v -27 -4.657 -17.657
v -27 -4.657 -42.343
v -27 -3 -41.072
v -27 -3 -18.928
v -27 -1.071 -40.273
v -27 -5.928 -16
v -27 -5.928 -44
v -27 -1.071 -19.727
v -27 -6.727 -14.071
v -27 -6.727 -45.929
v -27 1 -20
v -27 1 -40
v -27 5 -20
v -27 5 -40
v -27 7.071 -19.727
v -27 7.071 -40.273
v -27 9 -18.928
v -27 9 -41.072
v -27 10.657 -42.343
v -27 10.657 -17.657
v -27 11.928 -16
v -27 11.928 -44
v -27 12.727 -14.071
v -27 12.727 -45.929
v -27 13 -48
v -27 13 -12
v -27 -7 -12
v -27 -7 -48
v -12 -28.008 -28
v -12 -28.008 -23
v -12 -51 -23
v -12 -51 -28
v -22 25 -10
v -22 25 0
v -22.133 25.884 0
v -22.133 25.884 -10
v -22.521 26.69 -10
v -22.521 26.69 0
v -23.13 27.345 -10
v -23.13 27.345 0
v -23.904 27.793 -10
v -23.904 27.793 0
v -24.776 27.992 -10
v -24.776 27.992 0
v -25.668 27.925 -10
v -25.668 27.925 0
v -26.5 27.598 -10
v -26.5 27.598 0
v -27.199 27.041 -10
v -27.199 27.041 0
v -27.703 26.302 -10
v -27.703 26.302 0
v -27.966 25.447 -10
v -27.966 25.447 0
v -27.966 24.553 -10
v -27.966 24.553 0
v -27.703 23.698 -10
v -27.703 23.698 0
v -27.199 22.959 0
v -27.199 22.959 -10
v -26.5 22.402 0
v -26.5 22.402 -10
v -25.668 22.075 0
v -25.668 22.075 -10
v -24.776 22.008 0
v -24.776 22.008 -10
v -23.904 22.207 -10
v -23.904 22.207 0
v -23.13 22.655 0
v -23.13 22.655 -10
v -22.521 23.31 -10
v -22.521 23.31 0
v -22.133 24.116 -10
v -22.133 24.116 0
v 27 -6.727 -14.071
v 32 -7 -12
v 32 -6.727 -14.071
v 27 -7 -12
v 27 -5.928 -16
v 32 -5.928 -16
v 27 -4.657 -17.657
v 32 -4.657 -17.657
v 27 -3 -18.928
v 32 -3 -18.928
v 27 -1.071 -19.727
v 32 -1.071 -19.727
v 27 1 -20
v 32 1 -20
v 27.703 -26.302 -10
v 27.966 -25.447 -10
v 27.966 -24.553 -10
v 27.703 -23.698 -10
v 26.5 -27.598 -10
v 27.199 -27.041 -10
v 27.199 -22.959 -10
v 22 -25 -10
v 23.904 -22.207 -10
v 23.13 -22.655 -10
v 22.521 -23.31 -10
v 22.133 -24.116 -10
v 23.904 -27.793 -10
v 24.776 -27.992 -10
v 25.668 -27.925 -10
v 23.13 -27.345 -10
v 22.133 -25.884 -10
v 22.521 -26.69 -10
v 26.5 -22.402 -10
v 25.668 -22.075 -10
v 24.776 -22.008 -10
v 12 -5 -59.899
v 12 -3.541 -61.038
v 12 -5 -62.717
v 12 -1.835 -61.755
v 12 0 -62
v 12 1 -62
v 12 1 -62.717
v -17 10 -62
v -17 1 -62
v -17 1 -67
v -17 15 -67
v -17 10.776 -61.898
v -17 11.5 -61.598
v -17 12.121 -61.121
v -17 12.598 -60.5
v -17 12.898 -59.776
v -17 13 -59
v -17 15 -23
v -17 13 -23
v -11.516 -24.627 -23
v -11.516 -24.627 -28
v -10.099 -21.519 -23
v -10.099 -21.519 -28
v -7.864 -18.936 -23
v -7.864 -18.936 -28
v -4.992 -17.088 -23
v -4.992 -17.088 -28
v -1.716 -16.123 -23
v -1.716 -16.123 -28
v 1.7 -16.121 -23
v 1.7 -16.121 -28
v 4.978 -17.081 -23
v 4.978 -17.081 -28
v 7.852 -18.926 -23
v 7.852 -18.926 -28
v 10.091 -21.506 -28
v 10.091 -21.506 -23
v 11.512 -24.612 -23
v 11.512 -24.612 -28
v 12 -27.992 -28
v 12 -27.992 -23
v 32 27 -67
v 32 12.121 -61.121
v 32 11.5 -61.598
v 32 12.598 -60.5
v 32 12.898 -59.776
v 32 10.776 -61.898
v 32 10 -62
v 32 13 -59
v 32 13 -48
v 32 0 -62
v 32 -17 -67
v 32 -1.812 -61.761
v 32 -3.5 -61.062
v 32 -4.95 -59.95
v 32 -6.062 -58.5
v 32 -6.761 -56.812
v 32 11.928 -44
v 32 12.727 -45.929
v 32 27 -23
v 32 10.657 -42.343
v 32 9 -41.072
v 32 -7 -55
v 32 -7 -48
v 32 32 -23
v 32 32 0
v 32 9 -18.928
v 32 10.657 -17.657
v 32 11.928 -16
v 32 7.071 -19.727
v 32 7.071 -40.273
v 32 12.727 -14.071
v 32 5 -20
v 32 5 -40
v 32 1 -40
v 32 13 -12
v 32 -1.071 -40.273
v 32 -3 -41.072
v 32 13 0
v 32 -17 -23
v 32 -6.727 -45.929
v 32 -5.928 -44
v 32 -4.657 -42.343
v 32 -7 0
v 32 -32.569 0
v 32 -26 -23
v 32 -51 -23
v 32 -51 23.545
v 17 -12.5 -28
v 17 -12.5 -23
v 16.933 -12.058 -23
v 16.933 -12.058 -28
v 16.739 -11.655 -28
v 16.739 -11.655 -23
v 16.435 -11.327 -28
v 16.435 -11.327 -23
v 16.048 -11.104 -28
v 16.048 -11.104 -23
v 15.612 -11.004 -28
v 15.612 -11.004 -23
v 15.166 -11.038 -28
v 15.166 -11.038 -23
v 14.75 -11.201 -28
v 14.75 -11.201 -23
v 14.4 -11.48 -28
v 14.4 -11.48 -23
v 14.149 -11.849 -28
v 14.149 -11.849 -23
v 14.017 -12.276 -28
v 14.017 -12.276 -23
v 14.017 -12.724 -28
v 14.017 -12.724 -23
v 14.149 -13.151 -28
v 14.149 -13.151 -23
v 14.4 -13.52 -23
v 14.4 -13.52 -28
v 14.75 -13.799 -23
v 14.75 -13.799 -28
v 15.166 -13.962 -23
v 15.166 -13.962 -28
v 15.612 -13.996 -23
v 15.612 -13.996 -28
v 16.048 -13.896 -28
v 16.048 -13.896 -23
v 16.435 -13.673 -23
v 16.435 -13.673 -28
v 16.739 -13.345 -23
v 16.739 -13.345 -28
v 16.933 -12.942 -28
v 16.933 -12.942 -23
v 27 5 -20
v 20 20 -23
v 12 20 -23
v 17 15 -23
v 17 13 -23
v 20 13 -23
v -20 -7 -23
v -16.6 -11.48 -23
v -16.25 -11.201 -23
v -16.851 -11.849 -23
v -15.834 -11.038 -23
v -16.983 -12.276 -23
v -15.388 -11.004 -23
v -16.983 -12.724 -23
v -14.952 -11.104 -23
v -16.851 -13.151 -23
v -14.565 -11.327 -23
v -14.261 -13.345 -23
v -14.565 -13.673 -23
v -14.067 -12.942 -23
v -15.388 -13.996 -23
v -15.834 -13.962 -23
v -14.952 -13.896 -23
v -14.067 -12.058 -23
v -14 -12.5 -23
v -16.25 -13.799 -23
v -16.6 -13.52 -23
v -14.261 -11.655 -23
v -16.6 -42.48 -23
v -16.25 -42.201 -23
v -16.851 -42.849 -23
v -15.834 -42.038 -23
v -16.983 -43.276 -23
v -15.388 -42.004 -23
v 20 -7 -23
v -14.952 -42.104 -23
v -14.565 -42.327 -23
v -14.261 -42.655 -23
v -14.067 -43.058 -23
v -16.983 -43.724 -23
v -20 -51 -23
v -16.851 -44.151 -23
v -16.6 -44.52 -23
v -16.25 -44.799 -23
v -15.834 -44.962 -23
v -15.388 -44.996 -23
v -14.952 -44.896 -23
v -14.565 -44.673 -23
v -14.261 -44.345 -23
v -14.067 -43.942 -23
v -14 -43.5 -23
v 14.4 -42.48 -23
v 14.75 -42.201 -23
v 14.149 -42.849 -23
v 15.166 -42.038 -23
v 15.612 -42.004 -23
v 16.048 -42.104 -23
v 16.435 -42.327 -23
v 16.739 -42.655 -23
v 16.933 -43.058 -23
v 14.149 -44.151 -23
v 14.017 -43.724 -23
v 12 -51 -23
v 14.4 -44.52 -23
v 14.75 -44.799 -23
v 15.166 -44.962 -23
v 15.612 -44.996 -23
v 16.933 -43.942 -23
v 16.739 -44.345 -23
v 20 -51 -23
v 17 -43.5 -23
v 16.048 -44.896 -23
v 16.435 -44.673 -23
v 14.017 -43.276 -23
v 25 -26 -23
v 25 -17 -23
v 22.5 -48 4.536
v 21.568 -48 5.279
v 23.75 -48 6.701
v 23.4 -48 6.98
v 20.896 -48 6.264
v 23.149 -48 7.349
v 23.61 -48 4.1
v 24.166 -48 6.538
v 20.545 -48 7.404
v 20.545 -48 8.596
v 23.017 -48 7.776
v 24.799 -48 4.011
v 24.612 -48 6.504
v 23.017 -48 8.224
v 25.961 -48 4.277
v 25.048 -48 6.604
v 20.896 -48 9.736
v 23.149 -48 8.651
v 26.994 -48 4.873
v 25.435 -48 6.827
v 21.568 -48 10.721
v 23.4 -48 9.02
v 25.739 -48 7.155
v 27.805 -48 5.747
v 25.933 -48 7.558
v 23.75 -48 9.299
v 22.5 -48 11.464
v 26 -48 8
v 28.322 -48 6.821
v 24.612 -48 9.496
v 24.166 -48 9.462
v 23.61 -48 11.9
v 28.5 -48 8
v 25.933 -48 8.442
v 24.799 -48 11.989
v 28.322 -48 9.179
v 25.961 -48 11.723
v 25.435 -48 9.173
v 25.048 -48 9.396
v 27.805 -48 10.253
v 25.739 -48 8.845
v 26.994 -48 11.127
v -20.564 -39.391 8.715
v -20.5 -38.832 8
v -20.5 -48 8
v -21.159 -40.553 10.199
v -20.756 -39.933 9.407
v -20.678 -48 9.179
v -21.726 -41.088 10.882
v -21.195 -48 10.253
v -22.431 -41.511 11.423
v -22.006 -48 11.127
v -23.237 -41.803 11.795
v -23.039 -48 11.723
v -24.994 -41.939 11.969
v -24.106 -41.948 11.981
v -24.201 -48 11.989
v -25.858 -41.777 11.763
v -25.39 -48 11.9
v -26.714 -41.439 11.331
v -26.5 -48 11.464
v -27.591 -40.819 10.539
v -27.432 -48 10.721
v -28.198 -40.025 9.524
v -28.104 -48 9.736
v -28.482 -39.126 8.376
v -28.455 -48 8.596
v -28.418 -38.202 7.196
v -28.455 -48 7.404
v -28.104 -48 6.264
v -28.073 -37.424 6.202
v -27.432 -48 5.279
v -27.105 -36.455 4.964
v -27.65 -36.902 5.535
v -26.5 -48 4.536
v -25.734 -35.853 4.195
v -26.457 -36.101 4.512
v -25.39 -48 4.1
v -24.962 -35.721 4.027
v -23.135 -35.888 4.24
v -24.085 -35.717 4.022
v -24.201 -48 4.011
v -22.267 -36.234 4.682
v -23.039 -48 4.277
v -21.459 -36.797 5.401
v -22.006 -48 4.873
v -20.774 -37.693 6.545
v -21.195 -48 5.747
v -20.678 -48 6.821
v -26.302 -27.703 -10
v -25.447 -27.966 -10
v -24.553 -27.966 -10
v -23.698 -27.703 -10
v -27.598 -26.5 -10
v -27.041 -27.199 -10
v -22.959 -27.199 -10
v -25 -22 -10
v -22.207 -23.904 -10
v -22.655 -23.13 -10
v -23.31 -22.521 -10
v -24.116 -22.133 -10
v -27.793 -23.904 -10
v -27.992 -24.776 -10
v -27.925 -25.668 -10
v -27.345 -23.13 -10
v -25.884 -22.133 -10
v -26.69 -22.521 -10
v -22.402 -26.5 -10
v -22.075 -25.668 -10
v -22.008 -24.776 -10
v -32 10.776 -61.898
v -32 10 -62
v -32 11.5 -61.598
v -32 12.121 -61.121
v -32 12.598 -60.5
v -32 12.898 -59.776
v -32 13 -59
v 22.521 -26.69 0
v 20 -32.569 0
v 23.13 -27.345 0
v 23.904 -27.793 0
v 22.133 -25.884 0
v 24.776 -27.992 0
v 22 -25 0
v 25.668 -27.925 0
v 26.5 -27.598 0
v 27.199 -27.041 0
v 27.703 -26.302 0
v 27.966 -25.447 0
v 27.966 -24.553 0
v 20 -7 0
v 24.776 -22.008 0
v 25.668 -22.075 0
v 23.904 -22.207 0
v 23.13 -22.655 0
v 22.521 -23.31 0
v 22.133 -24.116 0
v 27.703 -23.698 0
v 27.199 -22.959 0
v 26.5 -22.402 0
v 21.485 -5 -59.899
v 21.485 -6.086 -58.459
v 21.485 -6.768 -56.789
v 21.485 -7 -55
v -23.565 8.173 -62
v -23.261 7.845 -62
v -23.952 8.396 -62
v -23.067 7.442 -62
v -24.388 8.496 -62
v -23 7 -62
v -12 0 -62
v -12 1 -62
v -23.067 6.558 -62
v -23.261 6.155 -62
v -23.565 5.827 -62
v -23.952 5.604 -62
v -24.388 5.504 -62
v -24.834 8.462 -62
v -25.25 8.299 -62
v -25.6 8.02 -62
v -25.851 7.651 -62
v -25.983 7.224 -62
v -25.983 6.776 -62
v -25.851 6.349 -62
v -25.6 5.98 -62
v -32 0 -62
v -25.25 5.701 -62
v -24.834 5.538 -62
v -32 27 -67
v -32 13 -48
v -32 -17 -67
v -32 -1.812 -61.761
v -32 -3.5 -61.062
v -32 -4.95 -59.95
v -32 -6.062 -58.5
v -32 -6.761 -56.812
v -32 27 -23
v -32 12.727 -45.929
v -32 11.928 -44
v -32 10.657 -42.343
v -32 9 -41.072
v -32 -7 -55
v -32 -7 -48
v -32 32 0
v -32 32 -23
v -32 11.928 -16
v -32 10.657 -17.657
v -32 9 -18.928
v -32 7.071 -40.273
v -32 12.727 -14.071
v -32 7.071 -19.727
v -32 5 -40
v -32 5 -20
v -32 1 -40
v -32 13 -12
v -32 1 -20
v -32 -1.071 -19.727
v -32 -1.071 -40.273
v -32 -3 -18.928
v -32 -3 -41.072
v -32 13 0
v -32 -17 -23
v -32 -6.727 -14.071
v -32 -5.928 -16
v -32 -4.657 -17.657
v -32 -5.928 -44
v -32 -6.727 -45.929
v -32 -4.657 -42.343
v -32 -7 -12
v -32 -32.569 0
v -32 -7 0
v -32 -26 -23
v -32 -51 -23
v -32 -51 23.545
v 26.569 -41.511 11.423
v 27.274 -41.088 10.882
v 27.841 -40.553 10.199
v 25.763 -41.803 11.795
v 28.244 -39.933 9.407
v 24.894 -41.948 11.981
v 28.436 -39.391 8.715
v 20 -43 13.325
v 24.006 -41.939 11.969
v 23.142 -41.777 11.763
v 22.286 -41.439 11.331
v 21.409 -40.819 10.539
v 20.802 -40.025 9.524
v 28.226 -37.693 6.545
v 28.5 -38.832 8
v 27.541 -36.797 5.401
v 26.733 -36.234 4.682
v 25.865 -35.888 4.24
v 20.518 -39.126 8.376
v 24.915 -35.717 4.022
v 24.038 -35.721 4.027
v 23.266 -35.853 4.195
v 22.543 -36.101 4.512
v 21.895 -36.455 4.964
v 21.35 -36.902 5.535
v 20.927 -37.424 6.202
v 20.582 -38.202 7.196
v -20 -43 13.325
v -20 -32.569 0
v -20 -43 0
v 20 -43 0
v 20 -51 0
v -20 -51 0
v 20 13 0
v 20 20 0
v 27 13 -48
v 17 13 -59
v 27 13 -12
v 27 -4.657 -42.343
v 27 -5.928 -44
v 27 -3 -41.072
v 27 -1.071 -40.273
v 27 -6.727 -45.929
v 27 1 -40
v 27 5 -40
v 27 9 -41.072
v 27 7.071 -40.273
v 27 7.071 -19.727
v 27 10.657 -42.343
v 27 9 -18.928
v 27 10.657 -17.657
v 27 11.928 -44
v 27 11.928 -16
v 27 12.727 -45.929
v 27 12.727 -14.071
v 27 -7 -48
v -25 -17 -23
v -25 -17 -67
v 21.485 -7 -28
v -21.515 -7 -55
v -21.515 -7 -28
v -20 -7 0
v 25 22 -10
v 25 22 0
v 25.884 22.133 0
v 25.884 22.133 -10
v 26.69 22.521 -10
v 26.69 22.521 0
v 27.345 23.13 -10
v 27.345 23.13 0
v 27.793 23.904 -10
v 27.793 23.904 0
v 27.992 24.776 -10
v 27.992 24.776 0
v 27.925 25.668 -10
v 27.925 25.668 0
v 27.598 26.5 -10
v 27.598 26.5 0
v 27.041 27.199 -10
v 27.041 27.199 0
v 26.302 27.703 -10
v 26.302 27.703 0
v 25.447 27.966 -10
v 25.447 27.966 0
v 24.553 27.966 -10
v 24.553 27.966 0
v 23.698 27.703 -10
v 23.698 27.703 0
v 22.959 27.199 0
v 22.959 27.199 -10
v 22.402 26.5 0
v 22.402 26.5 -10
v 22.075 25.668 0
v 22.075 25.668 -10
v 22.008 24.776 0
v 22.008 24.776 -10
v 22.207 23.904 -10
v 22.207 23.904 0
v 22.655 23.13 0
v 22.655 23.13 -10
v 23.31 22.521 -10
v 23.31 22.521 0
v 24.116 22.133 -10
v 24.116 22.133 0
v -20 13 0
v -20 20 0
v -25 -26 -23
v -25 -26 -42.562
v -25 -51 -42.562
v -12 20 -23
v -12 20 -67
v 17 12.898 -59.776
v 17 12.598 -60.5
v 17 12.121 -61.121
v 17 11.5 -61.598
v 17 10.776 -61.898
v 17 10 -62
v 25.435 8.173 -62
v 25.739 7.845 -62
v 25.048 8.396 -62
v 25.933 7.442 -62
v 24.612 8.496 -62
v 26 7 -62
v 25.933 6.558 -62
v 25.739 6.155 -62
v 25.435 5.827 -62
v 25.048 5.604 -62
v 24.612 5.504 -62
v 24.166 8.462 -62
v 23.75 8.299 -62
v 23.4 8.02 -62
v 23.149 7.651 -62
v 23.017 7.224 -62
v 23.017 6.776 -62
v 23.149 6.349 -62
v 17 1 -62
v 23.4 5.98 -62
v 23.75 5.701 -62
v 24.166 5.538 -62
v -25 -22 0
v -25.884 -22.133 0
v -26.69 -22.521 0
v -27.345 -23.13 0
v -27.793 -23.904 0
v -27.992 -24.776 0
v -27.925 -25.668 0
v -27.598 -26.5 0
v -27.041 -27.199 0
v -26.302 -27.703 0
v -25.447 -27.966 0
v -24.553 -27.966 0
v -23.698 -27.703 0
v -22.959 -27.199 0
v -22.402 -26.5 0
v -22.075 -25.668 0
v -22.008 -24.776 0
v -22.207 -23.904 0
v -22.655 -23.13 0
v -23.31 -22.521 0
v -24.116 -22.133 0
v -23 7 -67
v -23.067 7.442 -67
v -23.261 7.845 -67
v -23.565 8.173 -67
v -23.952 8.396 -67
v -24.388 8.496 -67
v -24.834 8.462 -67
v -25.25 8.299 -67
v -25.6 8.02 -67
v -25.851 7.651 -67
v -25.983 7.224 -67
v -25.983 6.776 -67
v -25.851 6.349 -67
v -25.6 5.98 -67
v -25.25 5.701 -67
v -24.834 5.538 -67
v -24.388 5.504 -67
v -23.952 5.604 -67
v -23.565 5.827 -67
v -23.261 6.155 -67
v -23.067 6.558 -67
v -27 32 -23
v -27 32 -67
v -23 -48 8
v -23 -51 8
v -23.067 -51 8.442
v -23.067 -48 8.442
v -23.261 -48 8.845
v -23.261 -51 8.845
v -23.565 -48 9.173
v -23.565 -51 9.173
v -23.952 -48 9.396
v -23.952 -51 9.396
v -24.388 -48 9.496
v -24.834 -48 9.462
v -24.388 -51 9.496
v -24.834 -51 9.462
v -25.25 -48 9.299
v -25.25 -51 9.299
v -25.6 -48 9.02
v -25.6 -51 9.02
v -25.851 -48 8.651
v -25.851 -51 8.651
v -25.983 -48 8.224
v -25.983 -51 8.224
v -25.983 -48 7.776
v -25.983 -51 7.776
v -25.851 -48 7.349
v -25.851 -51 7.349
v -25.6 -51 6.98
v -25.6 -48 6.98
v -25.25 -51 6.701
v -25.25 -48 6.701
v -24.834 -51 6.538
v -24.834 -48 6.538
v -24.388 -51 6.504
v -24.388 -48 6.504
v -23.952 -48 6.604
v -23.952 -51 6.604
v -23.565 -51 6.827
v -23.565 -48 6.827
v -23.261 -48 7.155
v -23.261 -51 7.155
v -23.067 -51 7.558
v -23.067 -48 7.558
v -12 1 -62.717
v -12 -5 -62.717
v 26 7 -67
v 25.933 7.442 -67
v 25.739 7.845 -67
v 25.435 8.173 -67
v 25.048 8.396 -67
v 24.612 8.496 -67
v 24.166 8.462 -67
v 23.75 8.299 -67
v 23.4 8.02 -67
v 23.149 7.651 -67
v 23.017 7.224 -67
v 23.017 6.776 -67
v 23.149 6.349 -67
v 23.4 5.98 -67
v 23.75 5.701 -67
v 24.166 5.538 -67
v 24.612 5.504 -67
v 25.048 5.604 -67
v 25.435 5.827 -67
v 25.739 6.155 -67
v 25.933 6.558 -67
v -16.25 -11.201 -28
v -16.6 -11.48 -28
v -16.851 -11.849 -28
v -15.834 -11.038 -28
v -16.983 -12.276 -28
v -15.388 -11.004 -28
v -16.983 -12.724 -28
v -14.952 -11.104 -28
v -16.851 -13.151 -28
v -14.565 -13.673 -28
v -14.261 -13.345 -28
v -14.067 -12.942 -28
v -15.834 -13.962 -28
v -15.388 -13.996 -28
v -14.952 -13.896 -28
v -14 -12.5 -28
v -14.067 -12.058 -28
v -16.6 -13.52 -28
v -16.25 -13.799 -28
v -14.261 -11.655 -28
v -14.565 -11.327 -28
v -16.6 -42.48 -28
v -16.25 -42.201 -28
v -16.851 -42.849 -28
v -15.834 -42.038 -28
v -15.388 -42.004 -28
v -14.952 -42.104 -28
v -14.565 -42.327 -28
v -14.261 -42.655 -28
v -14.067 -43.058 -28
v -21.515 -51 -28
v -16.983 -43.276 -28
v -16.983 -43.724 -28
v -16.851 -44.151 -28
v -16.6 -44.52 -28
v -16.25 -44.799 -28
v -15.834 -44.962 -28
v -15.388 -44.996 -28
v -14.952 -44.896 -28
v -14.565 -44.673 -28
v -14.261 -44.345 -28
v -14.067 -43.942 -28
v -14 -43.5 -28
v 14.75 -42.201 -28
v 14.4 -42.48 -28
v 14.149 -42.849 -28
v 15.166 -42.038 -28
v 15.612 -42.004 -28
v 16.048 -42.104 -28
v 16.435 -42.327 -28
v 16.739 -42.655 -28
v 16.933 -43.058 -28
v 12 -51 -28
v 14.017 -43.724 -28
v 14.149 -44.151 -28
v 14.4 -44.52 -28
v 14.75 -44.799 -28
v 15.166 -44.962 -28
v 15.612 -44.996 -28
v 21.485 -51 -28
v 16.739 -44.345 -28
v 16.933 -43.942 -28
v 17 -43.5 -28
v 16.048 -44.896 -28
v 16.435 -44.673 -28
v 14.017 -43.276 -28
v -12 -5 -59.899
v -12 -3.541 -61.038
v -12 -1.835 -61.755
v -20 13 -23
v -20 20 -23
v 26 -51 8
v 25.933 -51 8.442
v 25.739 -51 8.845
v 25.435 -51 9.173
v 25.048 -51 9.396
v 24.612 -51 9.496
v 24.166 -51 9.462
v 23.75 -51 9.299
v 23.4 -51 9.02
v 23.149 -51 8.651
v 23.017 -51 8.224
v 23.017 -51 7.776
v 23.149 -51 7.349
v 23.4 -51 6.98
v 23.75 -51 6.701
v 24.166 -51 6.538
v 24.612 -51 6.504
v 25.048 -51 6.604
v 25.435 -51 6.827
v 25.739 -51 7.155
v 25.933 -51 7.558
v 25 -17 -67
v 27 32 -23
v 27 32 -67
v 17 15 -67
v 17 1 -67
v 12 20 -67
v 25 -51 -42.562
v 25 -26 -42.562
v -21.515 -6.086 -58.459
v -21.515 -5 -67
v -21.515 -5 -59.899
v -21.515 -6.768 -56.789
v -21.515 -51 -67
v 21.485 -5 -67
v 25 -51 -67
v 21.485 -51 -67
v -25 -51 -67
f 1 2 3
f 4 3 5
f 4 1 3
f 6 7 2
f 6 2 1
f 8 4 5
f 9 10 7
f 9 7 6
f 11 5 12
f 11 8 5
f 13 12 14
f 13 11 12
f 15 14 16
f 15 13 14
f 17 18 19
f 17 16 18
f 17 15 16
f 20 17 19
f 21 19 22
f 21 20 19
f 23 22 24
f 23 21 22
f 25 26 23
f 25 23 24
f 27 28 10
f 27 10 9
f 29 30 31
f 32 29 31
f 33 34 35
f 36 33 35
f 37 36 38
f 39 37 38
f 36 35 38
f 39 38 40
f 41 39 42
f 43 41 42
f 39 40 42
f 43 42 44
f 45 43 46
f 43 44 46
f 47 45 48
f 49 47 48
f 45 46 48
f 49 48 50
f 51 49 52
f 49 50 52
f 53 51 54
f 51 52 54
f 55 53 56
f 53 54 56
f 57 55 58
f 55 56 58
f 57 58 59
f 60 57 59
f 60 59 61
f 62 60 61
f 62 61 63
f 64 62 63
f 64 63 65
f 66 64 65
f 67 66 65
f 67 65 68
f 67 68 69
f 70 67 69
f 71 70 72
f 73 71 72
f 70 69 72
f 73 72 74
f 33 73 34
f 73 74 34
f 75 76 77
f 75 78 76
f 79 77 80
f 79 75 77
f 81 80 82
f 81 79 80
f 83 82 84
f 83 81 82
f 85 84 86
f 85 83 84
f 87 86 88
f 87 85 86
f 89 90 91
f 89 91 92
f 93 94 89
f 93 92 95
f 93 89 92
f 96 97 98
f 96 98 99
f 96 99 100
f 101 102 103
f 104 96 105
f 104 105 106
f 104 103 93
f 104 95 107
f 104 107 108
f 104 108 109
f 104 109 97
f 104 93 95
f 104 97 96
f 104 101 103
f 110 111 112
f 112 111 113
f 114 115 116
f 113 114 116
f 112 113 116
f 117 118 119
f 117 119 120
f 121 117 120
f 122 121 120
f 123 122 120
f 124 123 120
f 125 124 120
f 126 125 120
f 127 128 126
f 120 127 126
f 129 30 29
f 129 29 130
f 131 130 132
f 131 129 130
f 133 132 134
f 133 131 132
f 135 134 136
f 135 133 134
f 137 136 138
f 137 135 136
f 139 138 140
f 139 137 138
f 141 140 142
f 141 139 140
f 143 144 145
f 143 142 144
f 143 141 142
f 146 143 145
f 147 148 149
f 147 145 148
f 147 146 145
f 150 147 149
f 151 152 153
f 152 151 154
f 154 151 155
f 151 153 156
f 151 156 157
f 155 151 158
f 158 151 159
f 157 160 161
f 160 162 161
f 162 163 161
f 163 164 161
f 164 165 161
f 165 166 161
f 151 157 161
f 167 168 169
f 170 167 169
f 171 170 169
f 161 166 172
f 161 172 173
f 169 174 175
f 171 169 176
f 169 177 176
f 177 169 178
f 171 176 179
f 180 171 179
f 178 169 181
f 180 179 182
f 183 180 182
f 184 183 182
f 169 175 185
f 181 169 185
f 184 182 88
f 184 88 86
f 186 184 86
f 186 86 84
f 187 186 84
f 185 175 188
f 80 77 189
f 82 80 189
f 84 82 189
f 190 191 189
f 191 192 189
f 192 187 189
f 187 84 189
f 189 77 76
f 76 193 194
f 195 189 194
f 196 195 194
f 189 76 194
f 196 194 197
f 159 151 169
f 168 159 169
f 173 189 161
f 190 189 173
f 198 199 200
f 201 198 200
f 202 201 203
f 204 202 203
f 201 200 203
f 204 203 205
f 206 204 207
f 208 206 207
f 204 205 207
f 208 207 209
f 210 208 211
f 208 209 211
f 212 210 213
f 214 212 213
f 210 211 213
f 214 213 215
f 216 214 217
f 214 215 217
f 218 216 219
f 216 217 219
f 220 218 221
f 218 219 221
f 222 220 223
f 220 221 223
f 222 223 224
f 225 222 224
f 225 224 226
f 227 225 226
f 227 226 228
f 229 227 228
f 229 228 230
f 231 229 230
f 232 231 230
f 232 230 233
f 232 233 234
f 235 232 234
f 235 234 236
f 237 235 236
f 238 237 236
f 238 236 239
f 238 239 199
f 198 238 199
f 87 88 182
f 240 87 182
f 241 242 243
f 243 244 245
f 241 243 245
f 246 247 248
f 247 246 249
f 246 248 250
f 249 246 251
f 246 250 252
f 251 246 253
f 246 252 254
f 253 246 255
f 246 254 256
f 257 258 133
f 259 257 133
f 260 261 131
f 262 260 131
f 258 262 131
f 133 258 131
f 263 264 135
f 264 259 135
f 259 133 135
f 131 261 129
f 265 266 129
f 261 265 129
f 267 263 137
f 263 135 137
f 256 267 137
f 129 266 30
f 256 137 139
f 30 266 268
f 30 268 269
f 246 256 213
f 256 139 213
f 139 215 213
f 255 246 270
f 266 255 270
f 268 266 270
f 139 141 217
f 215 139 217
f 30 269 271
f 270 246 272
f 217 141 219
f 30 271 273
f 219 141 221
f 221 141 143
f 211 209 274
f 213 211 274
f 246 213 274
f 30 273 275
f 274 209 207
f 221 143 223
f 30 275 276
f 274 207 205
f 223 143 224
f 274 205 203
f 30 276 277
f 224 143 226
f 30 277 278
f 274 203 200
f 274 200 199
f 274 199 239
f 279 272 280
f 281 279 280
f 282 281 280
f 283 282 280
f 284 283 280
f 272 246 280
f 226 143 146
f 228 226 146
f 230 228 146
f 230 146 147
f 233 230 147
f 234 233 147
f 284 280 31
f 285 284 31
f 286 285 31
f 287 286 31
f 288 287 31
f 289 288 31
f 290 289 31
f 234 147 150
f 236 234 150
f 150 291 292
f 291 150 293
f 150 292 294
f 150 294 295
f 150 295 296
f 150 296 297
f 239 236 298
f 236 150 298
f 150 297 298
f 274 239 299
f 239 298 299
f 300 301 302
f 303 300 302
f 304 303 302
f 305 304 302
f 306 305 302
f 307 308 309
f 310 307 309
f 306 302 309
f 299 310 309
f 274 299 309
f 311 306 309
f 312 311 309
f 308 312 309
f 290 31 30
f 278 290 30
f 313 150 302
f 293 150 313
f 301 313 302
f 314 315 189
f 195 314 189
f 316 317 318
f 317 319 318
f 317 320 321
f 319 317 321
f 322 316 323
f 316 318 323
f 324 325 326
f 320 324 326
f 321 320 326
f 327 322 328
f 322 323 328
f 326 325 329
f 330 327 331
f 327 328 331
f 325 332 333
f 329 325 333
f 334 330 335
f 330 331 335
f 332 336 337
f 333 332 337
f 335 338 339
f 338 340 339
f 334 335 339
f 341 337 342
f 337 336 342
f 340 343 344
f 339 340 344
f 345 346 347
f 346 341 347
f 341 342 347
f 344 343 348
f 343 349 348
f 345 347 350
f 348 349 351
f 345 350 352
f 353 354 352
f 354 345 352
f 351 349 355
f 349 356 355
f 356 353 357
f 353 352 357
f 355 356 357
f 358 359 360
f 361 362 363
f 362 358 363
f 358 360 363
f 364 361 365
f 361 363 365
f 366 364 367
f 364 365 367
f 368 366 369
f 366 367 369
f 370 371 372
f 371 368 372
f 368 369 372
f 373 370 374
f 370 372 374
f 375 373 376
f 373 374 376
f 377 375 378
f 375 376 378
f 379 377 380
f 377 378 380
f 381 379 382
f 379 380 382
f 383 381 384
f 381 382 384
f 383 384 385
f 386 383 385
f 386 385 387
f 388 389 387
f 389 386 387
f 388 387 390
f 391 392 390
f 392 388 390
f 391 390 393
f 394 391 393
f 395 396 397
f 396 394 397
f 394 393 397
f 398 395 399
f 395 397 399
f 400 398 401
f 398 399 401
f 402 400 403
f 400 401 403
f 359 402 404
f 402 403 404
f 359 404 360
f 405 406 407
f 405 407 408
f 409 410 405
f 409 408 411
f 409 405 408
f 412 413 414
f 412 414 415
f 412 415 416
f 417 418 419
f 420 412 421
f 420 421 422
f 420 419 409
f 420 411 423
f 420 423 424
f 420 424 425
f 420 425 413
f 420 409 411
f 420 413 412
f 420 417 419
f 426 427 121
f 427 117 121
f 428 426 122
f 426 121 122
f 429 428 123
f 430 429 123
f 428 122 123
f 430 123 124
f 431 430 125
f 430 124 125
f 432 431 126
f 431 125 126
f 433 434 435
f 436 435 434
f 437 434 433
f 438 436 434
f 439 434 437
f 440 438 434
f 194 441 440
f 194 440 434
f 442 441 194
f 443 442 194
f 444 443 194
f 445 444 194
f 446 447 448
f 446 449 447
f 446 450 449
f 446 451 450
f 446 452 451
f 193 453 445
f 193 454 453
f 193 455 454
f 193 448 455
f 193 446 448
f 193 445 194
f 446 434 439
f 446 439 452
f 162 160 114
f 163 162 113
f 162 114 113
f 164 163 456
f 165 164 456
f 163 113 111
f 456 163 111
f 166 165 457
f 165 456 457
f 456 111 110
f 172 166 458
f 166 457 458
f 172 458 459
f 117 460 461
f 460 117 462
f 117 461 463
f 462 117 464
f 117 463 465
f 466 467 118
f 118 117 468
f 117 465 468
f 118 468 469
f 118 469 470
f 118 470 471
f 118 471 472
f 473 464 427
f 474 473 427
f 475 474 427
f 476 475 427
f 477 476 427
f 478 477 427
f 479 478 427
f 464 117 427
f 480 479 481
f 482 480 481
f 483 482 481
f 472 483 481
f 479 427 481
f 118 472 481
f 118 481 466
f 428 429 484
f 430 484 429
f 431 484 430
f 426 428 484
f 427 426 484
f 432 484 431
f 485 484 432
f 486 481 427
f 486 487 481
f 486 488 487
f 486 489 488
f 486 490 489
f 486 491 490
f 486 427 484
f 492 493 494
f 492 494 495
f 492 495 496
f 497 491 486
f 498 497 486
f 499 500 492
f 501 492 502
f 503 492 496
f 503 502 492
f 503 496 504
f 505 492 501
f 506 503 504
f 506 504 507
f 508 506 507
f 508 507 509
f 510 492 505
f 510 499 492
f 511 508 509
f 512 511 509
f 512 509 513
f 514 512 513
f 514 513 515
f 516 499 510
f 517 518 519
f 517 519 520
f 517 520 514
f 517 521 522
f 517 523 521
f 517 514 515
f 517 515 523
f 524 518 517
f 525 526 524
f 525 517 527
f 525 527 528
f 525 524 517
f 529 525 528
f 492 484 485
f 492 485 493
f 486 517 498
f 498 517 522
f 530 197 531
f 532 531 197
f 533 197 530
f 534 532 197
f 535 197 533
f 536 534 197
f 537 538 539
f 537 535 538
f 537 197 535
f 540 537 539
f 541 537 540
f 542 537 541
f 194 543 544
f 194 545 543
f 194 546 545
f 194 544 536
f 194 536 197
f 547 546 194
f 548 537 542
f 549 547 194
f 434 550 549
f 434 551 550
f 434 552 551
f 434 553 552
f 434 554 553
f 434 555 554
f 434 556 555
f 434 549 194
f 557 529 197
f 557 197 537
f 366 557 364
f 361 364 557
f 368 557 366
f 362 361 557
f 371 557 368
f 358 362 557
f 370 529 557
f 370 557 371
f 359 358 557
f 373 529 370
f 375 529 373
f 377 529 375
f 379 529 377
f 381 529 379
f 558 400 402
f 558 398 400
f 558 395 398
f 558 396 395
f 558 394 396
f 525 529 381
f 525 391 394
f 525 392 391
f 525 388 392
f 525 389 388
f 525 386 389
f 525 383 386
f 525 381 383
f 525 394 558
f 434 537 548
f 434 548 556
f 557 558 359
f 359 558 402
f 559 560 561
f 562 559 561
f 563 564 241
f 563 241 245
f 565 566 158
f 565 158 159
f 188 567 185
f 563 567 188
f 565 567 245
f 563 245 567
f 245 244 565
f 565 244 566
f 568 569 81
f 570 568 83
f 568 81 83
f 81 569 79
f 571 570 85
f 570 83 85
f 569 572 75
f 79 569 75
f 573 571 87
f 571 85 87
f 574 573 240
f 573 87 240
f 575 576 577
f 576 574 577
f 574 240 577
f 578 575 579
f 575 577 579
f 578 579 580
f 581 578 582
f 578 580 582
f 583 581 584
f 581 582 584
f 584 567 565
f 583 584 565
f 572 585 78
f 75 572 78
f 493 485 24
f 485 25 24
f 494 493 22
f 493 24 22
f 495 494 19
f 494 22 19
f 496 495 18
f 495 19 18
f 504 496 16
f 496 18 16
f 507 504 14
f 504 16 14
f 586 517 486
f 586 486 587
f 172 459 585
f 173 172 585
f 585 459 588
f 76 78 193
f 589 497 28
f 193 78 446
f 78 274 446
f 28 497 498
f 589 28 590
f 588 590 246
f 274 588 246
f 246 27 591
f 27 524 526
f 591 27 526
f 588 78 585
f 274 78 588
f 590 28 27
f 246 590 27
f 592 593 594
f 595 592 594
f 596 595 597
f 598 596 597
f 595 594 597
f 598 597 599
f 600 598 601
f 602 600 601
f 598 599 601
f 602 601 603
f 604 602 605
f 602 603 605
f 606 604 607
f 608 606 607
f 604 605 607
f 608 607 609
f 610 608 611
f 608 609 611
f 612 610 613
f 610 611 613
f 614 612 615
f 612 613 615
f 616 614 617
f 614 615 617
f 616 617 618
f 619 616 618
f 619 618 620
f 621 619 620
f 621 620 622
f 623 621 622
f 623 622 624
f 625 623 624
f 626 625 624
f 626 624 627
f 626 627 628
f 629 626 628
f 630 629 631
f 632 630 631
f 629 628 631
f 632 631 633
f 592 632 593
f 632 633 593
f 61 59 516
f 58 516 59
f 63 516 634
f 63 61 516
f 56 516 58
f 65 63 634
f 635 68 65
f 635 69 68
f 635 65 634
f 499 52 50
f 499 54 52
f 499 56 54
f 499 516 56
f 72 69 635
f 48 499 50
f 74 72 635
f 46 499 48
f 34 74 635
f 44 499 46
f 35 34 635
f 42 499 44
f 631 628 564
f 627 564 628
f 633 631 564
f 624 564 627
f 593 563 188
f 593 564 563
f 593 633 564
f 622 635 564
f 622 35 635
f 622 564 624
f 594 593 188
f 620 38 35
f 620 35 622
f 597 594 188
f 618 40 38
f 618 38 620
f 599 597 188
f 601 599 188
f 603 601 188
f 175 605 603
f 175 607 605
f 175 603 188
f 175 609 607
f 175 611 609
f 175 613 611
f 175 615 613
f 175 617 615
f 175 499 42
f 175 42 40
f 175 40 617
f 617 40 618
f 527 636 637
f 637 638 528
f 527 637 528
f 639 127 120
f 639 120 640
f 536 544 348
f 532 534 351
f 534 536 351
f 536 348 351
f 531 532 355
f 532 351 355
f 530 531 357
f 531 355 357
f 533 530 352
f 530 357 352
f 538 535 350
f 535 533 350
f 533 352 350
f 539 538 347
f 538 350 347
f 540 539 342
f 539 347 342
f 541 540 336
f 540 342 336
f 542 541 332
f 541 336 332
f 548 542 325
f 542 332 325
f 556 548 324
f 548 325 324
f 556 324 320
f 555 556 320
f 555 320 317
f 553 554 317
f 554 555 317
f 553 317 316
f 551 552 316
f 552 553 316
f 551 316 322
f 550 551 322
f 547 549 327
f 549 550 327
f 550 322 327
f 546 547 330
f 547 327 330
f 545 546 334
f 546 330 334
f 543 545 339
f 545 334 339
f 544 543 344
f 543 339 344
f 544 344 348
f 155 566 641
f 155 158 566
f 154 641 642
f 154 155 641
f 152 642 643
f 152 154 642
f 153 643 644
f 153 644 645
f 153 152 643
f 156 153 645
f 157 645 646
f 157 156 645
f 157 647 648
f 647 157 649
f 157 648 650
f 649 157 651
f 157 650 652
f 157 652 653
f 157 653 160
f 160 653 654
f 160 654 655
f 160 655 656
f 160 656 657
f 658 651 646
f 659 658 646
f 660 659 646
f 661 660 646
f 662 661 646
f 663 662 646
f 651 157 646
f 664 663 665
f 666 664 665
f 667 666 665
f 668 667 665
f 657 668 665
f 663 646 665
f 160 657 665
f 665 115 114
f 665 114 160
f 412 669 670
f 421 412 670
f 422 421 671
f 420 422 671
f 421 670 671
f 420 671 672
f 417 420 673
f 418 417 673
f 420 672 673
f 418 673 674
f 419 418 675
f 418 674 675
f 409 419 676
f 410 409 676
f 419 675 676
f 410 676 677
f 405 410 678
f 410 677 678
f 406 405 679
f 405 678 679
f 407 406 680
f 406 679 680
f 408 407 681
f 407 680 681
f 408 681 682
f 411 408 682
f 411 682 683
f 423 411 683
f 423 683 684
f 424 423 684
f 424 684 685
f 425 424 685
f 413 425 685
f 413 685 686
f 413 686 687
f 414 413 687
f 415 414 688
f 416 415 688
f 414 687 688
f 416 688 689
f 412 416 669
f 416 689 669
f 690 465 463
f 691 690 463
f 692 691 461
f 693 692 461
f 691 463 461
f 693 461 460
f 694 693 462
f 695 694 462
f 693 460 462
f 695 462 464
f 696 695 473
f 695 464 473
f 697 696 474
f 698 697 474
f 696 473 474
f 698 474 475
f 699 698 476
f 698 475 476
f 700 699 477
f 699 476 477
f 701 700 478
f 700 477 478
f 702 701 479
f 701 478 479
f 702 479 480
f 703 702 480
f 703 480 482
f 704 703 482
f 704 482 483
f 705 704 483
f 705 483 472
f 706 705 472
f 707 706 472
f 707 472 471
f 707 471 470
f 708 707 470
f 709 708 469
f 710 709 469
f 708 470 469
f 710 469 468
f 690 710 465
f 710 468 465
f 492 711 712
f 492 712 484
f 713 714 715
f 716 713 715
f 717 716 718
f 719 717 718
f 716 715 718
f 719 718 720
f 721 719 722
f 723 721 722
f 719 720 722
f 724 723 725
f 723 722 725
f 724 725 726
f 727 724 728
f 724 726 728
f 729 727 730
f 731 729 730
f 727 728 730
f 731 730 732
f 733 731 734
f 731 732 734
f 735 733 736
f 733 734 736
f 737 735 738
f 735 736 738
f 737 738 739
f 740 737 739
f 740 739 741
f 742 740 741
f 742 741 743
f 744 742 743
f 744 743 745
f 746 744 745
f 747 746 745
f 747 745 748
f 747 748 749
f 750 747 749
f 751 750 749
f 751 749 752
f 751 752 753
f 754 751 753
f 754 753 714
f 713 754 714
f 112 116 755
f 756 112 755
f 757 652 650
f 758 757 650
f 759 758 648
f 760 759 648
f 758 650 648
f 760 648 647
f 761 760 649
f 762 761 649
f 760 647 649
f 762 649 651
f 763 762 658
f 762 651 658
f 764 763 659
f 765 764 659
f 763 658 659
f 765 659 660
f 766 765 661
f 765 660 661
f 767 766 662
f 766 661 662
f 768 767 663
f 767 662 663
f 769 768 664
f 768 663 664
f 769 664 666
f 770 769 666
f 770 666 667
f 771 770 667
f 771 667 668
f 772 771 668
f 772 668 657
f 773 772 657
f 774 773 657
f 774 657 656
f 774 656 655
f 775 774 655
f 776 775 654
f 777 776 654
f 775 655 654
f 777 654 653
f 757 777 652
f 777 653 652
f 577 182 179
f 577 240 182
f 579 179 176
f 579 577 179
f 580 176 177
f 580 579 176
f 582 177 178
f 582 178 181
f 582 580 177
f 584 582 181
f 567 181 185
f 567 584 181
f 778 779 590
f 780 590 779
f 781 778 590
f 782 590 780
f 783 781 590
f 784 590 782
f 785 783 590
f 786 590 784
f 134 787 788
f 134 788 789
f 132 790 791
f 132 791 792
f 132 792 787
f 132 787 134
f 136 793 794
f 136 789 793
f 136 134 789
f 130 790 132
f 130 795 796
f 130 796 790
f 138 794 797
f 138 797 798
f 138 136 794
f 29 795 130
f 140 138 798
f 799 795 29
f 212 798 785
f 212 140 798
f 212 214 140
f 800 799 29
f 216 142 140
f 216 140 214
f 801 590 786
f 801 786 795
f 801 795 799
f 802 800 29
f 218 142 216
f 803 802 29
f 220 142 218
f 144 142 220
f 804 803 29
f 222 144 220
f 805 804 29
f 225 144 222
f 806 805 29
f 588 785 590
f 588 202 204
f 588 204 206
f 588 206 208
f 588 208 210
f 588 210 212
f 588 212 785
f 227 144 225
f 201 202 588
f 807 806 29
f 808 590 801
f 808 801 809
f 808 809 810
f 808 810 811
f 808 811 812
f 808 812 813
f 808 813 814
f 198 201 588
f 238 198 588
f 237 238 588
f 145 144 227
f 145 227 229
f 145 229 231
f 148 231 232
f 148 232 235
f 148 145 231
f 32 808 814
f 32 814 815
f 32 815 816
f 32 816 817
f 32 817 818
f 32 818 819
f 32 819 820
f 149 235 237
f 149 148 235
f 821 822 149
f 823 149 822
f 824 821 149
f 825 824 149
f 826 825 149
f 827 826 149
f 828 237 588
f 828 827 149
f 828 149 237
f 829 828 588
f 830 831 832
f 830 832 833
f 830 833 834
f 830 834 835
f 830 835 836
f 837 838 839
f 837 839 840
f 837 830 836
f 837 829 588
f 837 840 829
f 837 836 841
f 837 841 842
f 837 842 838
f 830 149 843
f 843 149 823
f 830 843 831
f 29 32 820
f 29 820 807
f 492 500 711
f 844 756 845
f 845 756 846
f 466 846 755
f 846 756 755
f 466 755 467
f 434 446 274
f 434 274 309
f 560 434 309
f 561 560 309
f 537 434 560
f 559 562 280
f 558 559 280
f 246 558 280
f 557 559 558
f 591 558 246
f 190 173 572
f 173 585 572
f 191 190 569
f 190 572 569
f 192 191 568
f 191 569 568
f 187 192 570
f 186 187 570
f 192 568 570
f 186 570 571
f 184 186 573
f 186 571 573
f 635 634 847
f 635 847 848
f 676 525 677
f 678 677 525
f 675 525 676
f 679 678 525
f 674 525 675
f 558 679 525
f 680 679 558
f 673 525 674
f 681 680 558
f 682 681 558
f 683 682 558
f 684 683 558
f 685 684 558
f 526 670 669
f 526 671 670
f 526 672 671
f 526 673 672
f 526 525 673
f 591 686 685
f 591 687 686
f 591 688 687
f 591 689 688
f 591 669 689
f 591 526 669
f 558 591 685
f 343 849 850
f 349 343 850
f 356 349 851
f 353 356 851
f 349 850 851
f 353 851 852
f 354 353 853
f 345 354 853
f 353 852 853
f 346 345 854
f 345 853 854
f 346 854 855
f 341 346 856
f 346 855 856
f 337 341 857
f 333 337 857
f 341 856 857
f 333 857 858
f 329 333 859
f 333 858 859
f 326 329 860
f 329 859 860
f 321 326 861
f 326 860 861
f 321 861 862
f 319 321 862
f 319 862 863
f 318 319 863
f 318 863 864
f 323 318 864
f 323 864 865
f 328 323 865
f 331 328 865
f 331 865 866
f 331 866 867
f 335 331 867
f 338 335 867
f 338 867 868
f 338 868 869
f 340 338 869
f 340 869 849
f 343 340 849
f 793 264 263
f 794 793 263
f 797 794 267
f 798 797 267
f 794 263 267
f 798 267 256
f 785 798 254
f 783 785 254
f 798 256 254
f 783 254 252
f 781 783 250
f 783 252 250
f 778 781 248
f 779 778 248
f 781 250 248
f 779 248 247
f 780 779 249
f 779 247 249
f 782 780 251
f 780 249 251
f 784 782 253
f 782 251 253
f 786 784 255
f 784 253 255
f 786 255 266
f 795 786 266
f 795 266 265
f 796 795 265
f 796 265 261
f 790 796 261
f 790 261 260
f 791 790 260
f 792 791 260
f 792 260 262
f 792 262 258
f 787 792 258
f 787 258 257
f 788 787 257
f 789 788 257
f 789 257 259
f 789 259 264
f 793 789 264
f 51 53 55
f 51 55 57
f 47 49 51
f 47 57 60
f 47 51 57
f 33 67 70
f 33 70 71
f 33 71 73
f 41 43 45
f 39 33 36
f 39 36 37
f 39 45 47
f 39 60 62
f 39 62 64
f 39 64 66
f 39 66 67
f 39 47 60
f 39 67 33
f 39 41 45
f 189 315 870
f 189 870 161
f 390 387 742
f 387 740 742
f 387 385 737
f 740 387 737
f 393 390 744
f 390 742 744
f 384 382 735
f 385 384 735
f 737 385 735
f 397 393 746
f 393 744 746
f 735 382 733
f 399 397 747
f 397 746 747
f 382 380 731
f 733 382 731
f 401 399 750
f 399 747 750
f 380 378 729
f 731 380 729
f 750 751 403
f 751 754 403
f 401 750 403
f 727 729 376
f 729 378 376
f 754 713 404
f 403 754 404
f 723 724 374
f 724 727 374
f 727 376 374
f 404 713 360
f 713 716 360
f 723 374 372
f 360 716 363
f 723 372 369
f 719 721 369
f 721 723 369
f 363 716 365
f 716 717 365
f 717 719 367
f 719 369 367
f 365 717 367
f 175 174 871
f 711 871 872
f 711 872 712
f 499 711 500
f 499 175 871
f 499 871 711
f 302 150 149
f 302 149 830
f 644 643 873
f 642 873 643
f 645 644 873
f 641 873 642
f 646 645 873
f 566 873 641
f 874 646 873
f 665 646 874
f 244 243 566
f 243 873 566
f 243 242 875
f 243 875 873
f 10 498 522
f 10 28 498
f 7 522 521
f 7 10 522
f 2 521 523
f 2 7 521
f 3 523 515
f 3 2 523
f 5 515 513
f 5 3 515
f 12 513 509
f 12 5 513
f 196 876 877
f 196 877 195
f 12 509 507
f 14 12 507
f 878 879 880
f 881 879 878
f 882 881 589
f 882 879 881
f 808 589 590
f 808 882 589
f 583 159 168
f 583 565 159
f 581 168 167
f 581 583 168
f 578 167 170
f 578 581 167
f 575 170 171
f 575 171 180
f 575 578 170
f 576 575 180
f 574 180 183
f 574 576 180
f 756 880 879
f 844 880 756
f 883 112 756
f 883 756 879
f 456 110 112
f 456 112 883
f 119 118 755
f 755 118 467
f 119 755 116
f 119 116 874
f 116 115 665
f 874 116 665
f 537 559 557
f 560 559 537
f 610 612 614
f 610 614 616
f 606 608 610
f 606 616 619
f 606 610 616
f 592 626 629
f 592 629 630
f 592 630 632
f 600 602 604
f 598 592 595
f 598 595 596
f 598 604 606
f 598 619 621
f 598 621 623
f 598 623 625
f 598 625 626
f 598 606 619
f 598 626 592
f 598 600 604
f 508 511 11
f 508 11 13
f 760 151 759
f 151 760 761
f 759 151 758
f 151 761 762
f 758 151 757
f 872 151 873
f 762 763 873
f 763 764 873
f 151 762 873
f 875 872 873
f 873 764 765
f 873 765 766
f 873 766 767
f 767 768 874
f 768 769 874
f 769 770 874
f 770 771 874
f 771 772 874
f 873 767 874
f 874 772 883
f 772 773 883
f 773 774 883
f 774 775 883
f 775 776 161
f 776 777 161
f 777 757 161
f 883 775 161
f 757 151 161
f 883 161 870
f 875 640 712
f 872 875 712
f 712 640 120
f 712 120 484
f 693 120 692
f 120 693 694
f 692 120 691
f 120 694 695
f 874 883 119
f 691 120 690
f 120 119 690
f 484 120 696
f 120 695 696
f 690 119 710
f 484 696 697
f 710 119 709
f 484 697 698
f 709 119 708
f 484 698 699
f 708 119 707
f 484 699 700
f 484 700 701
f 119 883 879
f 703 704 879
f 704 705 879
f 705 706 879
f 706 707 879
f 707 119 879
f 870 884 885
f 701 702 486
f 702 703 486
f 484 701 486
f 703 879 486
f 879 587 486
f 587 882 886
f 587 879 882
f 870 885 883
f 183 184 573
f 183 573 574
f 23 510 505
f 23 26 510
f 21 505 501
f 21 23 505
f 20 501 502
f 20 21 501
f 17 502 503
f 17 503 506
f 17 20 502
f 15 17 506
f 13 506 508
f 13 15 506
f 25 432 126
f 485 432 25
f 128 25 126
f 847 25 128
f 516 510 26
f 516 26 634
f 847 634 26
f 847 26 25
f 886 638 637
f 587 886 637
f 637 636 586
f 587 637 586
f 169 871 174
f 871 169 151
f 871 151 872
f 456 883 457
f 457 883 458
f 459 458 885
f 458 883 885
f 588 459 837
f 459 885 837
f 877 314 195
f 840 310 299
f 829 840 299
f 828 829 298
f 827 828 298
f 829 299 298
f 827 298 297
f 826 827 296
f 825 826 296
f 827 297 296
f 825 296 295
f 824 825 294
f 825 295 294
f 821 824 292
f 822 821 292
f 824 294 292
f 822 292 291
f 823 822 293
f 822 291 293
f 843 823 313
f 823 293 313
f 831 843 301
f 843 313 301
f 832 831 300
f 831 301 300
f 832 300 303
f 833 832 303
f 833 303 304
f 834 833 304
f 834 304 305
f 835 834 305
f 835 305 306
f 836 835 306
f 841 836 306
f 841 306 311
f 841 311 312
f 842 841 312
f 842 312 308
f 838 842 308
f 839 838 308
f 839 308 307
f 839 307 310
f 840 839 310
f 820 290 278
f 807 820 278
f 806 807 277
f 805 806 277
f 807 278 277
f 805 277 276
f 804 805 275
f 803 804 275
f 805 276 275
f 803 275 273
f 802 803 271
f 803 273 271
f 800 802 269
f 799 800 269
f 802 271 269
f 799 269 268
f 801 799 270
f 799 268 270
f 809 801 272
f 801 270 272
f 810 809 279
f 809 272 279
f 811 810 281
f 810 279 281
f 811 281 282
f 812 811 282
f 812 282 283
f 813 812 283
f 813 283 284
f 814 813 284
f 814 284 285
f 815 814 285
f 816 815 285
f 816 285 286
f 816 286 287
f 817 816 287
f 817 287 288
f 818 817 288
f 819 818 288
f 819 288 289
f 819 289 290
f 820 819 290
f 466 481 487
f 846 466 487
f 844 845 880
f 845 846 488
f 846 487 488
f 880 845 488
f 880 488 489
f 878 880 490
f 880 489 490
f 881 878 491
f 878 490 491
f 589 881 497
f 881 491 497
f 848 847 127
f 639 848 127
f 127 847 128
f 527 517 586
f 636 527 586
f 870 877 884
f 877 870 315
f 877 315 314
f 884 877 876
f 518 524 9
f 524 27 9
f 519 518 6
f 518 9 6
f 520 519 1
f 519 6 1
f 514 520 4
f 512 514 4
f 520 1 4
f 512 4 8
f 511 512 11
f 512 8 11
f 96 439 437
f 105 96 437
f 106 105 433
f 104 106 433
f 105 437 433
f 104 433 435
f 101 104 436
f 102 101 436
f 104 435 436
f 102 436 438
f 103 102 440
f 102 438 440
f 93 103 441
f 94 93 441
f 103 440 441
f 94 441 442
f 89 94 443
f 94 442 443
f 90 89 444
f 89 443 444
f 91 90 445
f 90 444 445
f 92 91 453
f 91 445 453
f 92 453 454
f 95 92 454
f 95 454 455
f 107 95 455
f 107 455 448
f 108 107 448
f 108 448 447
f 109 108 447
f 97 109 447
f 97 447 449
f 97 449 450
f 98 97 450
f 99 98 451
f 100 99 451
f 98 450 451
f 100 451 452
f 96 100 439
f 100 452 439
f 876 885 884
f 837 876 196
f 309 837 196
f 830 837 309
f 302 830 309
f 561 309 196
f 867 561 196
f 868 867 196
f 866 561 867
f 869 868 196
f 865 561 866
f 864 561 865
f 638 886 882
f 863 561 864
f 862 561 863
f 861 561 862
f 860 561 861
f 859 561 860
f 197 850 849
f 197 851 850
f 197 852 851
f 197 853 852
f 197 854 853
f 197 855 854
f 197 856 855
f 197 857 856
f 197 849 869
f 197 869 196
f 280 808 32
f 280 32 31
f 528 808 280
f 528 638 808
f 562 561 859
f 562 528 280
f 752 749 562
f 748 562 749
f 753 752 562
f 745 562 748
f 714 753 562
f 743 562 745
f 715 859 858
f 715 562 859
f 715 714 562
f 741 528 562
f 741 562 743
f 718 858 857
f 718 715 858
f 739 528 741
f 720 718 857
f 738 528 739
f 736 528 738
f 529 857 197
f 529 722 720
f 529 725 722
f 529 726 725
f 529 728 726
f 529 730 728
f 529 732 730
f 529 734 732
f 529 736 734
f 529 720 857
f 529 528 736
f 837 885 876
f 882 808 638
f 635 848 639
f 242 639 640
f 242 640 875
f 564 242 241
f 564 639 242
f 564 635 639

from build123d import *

# Parameters (mm, degrees)
PAD009_DEPTH          = 23
PAD010_DEPTH          = 44
SKETCH024_W           = 43
SKETCH024_H           = 50
POCKET012_DEPTH       = 46
PAD011_DEPTH          = 25
SKETCH026_R           = 1.5
POCKET013_DEPTH       = 44.001
SKETCH027_R           = 3
POCKET014_DEPTH       = 10
POLARPATTERN001_COUNT = 4
POCKET011_DEPTH       = 6
PAD008_DEPTH          = 44
POCKET015_DEPTH       = 64.001
PAD013_DEPTH          = 64
SKETCH032_W           = 40
SKETCH032_H           = 10.43081
POCKET016_DEPTH       = 23.545613
SKETCH033_R           = 1.5
POCKET017_DEPTH       = 83.001
SKETCH034_R           = 4
POCKET018_DEPTH       = 80.001
SKETCH036_R           = 1.5
POCKET019_DEPTH       = 5
SKETCH037_R           = 3
POCKET020_DEPTH       = 10
SKETCH052_W           = 20
SKETCH052_H           = 20
PAD024_DEPTH          = 5
FILLET_R              = 8
FILLET001_R           = 3


with BuildPart() as part:
    # Sketch022 → Pad009 (new body)
    with BuildSketch(Plane.XY):
        Polygon((32, -51), (32, 32), (-32, 32), (-32, -51), (-20, -51), (-20, 20), (20, 20), (20, -51), align=None)
    extrude(amount=-PAD009_DEPTH)

    # Sketch023 (on Face10 of Pad009) → Pad010 (join)
    with BuildSketch(Plane(origin=(0, 0, -23), x_dir=(1, 0, 0), z_dir=(0, 0, -1))):
        with BuildLine():
            Line((-25, 51), (-25, -1))
            Line((-25, -1), (25, -1))
            Line((25, -1), (25, 51))
            Line((25, 51), (11.999997, 51))
            Line((11.999997, 27.99216), (11.999997, 51))
            ThreePointArc((-11.999997, 28.007844), (-0.007842, 16.000003), (11.999997, 27.99216))
            Line((-11.999997, 28.007844), (-11.999997, 51))
            Line((-11.999997, 51), (-25, 51))
        make_face()
    extrude(amount=PAD010_DEPTH)

    # Sketch024 (on Face18 of Pad010) → Pocket012 (cut)
    with BuildSketch(Plane.XZ.offset(51)):
        with Locations((-0.015156, -53)):
            Rectangle(SKETCH024_W, SKETCH024_H)
    extrude(amount=-POCKET012_DEPTH, mode=Mode.SUBTRACT)

    # Sketch025 (on Face14 of Pocket012) → Pad011 (join)
    with BuildSketch(Plane.XZ.offset(51)):
        Polygon((-32, -23), (-25, -23), (-25, -42.561909), align=None)
        Polygon((32, -23), (25, -23), (25, -42.561909), align=None)
    extrude(amount=-PAD011_DEPTH)

    # Sketch026 (on Face11 of Pad011) → Pocket013 (cut, through all)
    with BuildSketch(Plane.XY.offset(-23)):
        with Locations((-15.5, -12.5)):
            Circle(SKETCH026_R)
        with Locations((-15.5, -43.5)):
            Circle(SKETCH026_R)
        with Locations((15.5, -43.5)):
            Circle(SKETCH026_R)
        with Locations((15.5, -12.5)):
            Circle(SKETCH026_R)
    extrude(amount=-POCKET013_DEPTH, mode=Mode.SUBTRACT)

    # Sketch027 (on Face4 of Pocket013) → Pocket014 (cut)
    with BuildSketch(Plane.XY):
        with Locations((-25, 25)):
            Circle(SKETCH027_R)
    pocket014 = extrude(amount=-POCKET014_DEPTH, mode=Mode.SUBTRACT)

    # PolarPattern001: Pocket014 ×4 about axis
    polarpattern001_axis = Axis((0, 0, 0), (0, 0, 1))
    for i in range(1, POLARPATTERN001_COUNT):
        add(pocket014.rotate(polarpattern001_axis, i * 360 / POLARPATTERN001_COUNT), mode=Mode.SUBTRACT)

    # Sketch028 (on Face23 of PolarPattern001) → Pocket011 (cut)
    with BuildSketch(Plane(origin=(0, 1, 0), x_dir=(-1, 0, 0), z_dir=(0, 1, 0))):
        with BuildLine():
            Line((-11.999999, -62.717157), (12.000001, -62.717157))
            Line((12.000001, -62.717157), (12.000001, -49.356773))
            ThreePointArc((12.000001, -49.356773), (1e-06, -37.356773), (-11.999999, -49.356773))
            Line((-11.999999, -49.356773), (-11.999999, -62.717157))
        make_face()
    extrude(amount=-POCKET011_DEPTH, mode=Mode.SUBTRACT)

    # Sketch021 (on Face6 of Pocket011) → Pad008 (join)
    with BuildSketch(Plane(origin=(0, 0, -23), x_dir=(1, 0, 0), z_dir=(0, 0, -1))):
        Polygon((-32, 17), (-25, 17), (-25, 7), (-17, -1), (-17, -15), (-12, -20), (12, -20), (17, -15), (17, -1), (25, 7), (25, 17), (32, 17), (32, -27), (27, -32), (-27, -32), (-32, -27), align=None)
    extrude(amount=PAD008_DEPTH)

    # Sketch029 (on Face52 of Pad008) → Pocket015 (cut, through all)
    with BuildSketch(Plane(origin=(-32, 0, 0), x_dir=(0, -1, 0), z_dir=(-1, 0, 0))):
        with BuildLine():
            Line((7, 0), (-13, 0))
            Line((-13, -62), (-13, 0))
            Line((-13, -62), (0, -62))
            ThreePointArc((0, -62), (4.949747, -59.949747), (7, -55))
            Line((7, -55), (7, 0))
        make_face()
    extrude(amount=-POCKET015_DEPTH, mode=Mode.SUBTRACT)

    # Sketch031 (on Face10 of Pocket015) → Pad013 (join)
    with BuildSketch(Plane(origin=(-32, 0, 0), x_dir=(0, -1, 0), z_dir=(-1, 0, 0))):
        Polygon((51, 0), (51, 23.544613), (32.56919, 0), align=None)
    extrude(amount=-PAD013_DEPTH)

    # Sketch032 (on Face54 of Pad013) → Pocket016 (cut, through all)
    with BuildSketch(Plane(origin=(0, 0, 0), x_dir=(1, 0, 0), z_dir=(0, 0, -1))):
        with Locations((0, 37.784595)):
            Rectangle(SKETCH032_W, SKETCH032_H)
    extrude(amount=-POCKET016_DEPTH, mode=Mode.SUBTRACT)

    # Sketch033 (on Face19 of Pocket016) → Pocket017 (cut, through all)
    with BuildSketch(Plane.XZ.offset(51)):
        with Locations((-24.5, 8)):
            Circle(SKETCH033_R)
        with Locations((24.5, 8)):
            Circle(SKETCH033_R)
    extrude(amount=-POCKET017_DEPTH, mode=Mode.SUBTRACT)

    # Sketch034 (on Face19 of Pocket017) → Pocket018 (cut, through all)
    with BuildSketch(Plane.XZ.offset(48)):
        with Locations((-24.5, 8)):
            Circle(SKETCH034_R)
        with Locations((24.5, 8)):
            Circle(SKETCH034_R)
    extrude(amount=-POCKET018_DEPTH, mode=Mode.SUBTRACT)

    # Sketch036 (on Face6 of Pocket018) → Pocket019 (cut)
    with BuildSketch(Plane.XY.offset(-62)):
        with Locations((24.5, 7)):
            Circle(SKETCH036_R)
        with Locations((-24.5, 7)):
            Circle(SKETCH036_R)
    extrude(amount=-POCKET019_DEPTH, mode=Mode.SUBTRACT)

    # Sketch037 (on Face43 of Pocket019) → Pocket020 (cut)
    with BuildSketch(Plane.XY):
        with Locations((-24.5, 7)):
            Circle(SKETCH037_R)
        with Locations((24.5, 7)):
            Circle(SKETCH037_R)
    extrude(amount=-POCKET020_DEPTH, mode=Mode.SUBTRACT)

    # Sketch052 (on Face17 of Pocket020) → Pad024 (join)
    with BuildSketch(Plane.YZ.offset(32)):
        with Locations((3, -30)):
            Rectangle(SKETCH052_W, SKETCH052_H)
    pad024 = extrude(amount=-PAD024_DEPTH)

    # Mirrored002: Pad024 across YZ
    add(pad024.mirror(Plane.YZ))

    # Fillet
    fillet_edges = [part.edges().sort_by_distance(p)[0] for p in [
        (29.5, -7, -20),
        (29.5, 13, -20),
        (29.5, 13, -40),
        (29.5, -7, -40),
        (-29.5, -7, -20),
        (-29.5, 13, -20),
        (-29.5, -7, -40),
        (-29.5, 13, -40),
    ]]
    fillet(fillet_edges, radius=FILLET_R)

    # Fillet001
    fillet001_edges = [part.edges().sort_by_distance(p)[0] for p in [
        (24.5, 13, -62),
        (-24.5, 13, -62),
    ]]
    fillet(fillet001_edges, radius=FILLET001_R)


solid = part.part
